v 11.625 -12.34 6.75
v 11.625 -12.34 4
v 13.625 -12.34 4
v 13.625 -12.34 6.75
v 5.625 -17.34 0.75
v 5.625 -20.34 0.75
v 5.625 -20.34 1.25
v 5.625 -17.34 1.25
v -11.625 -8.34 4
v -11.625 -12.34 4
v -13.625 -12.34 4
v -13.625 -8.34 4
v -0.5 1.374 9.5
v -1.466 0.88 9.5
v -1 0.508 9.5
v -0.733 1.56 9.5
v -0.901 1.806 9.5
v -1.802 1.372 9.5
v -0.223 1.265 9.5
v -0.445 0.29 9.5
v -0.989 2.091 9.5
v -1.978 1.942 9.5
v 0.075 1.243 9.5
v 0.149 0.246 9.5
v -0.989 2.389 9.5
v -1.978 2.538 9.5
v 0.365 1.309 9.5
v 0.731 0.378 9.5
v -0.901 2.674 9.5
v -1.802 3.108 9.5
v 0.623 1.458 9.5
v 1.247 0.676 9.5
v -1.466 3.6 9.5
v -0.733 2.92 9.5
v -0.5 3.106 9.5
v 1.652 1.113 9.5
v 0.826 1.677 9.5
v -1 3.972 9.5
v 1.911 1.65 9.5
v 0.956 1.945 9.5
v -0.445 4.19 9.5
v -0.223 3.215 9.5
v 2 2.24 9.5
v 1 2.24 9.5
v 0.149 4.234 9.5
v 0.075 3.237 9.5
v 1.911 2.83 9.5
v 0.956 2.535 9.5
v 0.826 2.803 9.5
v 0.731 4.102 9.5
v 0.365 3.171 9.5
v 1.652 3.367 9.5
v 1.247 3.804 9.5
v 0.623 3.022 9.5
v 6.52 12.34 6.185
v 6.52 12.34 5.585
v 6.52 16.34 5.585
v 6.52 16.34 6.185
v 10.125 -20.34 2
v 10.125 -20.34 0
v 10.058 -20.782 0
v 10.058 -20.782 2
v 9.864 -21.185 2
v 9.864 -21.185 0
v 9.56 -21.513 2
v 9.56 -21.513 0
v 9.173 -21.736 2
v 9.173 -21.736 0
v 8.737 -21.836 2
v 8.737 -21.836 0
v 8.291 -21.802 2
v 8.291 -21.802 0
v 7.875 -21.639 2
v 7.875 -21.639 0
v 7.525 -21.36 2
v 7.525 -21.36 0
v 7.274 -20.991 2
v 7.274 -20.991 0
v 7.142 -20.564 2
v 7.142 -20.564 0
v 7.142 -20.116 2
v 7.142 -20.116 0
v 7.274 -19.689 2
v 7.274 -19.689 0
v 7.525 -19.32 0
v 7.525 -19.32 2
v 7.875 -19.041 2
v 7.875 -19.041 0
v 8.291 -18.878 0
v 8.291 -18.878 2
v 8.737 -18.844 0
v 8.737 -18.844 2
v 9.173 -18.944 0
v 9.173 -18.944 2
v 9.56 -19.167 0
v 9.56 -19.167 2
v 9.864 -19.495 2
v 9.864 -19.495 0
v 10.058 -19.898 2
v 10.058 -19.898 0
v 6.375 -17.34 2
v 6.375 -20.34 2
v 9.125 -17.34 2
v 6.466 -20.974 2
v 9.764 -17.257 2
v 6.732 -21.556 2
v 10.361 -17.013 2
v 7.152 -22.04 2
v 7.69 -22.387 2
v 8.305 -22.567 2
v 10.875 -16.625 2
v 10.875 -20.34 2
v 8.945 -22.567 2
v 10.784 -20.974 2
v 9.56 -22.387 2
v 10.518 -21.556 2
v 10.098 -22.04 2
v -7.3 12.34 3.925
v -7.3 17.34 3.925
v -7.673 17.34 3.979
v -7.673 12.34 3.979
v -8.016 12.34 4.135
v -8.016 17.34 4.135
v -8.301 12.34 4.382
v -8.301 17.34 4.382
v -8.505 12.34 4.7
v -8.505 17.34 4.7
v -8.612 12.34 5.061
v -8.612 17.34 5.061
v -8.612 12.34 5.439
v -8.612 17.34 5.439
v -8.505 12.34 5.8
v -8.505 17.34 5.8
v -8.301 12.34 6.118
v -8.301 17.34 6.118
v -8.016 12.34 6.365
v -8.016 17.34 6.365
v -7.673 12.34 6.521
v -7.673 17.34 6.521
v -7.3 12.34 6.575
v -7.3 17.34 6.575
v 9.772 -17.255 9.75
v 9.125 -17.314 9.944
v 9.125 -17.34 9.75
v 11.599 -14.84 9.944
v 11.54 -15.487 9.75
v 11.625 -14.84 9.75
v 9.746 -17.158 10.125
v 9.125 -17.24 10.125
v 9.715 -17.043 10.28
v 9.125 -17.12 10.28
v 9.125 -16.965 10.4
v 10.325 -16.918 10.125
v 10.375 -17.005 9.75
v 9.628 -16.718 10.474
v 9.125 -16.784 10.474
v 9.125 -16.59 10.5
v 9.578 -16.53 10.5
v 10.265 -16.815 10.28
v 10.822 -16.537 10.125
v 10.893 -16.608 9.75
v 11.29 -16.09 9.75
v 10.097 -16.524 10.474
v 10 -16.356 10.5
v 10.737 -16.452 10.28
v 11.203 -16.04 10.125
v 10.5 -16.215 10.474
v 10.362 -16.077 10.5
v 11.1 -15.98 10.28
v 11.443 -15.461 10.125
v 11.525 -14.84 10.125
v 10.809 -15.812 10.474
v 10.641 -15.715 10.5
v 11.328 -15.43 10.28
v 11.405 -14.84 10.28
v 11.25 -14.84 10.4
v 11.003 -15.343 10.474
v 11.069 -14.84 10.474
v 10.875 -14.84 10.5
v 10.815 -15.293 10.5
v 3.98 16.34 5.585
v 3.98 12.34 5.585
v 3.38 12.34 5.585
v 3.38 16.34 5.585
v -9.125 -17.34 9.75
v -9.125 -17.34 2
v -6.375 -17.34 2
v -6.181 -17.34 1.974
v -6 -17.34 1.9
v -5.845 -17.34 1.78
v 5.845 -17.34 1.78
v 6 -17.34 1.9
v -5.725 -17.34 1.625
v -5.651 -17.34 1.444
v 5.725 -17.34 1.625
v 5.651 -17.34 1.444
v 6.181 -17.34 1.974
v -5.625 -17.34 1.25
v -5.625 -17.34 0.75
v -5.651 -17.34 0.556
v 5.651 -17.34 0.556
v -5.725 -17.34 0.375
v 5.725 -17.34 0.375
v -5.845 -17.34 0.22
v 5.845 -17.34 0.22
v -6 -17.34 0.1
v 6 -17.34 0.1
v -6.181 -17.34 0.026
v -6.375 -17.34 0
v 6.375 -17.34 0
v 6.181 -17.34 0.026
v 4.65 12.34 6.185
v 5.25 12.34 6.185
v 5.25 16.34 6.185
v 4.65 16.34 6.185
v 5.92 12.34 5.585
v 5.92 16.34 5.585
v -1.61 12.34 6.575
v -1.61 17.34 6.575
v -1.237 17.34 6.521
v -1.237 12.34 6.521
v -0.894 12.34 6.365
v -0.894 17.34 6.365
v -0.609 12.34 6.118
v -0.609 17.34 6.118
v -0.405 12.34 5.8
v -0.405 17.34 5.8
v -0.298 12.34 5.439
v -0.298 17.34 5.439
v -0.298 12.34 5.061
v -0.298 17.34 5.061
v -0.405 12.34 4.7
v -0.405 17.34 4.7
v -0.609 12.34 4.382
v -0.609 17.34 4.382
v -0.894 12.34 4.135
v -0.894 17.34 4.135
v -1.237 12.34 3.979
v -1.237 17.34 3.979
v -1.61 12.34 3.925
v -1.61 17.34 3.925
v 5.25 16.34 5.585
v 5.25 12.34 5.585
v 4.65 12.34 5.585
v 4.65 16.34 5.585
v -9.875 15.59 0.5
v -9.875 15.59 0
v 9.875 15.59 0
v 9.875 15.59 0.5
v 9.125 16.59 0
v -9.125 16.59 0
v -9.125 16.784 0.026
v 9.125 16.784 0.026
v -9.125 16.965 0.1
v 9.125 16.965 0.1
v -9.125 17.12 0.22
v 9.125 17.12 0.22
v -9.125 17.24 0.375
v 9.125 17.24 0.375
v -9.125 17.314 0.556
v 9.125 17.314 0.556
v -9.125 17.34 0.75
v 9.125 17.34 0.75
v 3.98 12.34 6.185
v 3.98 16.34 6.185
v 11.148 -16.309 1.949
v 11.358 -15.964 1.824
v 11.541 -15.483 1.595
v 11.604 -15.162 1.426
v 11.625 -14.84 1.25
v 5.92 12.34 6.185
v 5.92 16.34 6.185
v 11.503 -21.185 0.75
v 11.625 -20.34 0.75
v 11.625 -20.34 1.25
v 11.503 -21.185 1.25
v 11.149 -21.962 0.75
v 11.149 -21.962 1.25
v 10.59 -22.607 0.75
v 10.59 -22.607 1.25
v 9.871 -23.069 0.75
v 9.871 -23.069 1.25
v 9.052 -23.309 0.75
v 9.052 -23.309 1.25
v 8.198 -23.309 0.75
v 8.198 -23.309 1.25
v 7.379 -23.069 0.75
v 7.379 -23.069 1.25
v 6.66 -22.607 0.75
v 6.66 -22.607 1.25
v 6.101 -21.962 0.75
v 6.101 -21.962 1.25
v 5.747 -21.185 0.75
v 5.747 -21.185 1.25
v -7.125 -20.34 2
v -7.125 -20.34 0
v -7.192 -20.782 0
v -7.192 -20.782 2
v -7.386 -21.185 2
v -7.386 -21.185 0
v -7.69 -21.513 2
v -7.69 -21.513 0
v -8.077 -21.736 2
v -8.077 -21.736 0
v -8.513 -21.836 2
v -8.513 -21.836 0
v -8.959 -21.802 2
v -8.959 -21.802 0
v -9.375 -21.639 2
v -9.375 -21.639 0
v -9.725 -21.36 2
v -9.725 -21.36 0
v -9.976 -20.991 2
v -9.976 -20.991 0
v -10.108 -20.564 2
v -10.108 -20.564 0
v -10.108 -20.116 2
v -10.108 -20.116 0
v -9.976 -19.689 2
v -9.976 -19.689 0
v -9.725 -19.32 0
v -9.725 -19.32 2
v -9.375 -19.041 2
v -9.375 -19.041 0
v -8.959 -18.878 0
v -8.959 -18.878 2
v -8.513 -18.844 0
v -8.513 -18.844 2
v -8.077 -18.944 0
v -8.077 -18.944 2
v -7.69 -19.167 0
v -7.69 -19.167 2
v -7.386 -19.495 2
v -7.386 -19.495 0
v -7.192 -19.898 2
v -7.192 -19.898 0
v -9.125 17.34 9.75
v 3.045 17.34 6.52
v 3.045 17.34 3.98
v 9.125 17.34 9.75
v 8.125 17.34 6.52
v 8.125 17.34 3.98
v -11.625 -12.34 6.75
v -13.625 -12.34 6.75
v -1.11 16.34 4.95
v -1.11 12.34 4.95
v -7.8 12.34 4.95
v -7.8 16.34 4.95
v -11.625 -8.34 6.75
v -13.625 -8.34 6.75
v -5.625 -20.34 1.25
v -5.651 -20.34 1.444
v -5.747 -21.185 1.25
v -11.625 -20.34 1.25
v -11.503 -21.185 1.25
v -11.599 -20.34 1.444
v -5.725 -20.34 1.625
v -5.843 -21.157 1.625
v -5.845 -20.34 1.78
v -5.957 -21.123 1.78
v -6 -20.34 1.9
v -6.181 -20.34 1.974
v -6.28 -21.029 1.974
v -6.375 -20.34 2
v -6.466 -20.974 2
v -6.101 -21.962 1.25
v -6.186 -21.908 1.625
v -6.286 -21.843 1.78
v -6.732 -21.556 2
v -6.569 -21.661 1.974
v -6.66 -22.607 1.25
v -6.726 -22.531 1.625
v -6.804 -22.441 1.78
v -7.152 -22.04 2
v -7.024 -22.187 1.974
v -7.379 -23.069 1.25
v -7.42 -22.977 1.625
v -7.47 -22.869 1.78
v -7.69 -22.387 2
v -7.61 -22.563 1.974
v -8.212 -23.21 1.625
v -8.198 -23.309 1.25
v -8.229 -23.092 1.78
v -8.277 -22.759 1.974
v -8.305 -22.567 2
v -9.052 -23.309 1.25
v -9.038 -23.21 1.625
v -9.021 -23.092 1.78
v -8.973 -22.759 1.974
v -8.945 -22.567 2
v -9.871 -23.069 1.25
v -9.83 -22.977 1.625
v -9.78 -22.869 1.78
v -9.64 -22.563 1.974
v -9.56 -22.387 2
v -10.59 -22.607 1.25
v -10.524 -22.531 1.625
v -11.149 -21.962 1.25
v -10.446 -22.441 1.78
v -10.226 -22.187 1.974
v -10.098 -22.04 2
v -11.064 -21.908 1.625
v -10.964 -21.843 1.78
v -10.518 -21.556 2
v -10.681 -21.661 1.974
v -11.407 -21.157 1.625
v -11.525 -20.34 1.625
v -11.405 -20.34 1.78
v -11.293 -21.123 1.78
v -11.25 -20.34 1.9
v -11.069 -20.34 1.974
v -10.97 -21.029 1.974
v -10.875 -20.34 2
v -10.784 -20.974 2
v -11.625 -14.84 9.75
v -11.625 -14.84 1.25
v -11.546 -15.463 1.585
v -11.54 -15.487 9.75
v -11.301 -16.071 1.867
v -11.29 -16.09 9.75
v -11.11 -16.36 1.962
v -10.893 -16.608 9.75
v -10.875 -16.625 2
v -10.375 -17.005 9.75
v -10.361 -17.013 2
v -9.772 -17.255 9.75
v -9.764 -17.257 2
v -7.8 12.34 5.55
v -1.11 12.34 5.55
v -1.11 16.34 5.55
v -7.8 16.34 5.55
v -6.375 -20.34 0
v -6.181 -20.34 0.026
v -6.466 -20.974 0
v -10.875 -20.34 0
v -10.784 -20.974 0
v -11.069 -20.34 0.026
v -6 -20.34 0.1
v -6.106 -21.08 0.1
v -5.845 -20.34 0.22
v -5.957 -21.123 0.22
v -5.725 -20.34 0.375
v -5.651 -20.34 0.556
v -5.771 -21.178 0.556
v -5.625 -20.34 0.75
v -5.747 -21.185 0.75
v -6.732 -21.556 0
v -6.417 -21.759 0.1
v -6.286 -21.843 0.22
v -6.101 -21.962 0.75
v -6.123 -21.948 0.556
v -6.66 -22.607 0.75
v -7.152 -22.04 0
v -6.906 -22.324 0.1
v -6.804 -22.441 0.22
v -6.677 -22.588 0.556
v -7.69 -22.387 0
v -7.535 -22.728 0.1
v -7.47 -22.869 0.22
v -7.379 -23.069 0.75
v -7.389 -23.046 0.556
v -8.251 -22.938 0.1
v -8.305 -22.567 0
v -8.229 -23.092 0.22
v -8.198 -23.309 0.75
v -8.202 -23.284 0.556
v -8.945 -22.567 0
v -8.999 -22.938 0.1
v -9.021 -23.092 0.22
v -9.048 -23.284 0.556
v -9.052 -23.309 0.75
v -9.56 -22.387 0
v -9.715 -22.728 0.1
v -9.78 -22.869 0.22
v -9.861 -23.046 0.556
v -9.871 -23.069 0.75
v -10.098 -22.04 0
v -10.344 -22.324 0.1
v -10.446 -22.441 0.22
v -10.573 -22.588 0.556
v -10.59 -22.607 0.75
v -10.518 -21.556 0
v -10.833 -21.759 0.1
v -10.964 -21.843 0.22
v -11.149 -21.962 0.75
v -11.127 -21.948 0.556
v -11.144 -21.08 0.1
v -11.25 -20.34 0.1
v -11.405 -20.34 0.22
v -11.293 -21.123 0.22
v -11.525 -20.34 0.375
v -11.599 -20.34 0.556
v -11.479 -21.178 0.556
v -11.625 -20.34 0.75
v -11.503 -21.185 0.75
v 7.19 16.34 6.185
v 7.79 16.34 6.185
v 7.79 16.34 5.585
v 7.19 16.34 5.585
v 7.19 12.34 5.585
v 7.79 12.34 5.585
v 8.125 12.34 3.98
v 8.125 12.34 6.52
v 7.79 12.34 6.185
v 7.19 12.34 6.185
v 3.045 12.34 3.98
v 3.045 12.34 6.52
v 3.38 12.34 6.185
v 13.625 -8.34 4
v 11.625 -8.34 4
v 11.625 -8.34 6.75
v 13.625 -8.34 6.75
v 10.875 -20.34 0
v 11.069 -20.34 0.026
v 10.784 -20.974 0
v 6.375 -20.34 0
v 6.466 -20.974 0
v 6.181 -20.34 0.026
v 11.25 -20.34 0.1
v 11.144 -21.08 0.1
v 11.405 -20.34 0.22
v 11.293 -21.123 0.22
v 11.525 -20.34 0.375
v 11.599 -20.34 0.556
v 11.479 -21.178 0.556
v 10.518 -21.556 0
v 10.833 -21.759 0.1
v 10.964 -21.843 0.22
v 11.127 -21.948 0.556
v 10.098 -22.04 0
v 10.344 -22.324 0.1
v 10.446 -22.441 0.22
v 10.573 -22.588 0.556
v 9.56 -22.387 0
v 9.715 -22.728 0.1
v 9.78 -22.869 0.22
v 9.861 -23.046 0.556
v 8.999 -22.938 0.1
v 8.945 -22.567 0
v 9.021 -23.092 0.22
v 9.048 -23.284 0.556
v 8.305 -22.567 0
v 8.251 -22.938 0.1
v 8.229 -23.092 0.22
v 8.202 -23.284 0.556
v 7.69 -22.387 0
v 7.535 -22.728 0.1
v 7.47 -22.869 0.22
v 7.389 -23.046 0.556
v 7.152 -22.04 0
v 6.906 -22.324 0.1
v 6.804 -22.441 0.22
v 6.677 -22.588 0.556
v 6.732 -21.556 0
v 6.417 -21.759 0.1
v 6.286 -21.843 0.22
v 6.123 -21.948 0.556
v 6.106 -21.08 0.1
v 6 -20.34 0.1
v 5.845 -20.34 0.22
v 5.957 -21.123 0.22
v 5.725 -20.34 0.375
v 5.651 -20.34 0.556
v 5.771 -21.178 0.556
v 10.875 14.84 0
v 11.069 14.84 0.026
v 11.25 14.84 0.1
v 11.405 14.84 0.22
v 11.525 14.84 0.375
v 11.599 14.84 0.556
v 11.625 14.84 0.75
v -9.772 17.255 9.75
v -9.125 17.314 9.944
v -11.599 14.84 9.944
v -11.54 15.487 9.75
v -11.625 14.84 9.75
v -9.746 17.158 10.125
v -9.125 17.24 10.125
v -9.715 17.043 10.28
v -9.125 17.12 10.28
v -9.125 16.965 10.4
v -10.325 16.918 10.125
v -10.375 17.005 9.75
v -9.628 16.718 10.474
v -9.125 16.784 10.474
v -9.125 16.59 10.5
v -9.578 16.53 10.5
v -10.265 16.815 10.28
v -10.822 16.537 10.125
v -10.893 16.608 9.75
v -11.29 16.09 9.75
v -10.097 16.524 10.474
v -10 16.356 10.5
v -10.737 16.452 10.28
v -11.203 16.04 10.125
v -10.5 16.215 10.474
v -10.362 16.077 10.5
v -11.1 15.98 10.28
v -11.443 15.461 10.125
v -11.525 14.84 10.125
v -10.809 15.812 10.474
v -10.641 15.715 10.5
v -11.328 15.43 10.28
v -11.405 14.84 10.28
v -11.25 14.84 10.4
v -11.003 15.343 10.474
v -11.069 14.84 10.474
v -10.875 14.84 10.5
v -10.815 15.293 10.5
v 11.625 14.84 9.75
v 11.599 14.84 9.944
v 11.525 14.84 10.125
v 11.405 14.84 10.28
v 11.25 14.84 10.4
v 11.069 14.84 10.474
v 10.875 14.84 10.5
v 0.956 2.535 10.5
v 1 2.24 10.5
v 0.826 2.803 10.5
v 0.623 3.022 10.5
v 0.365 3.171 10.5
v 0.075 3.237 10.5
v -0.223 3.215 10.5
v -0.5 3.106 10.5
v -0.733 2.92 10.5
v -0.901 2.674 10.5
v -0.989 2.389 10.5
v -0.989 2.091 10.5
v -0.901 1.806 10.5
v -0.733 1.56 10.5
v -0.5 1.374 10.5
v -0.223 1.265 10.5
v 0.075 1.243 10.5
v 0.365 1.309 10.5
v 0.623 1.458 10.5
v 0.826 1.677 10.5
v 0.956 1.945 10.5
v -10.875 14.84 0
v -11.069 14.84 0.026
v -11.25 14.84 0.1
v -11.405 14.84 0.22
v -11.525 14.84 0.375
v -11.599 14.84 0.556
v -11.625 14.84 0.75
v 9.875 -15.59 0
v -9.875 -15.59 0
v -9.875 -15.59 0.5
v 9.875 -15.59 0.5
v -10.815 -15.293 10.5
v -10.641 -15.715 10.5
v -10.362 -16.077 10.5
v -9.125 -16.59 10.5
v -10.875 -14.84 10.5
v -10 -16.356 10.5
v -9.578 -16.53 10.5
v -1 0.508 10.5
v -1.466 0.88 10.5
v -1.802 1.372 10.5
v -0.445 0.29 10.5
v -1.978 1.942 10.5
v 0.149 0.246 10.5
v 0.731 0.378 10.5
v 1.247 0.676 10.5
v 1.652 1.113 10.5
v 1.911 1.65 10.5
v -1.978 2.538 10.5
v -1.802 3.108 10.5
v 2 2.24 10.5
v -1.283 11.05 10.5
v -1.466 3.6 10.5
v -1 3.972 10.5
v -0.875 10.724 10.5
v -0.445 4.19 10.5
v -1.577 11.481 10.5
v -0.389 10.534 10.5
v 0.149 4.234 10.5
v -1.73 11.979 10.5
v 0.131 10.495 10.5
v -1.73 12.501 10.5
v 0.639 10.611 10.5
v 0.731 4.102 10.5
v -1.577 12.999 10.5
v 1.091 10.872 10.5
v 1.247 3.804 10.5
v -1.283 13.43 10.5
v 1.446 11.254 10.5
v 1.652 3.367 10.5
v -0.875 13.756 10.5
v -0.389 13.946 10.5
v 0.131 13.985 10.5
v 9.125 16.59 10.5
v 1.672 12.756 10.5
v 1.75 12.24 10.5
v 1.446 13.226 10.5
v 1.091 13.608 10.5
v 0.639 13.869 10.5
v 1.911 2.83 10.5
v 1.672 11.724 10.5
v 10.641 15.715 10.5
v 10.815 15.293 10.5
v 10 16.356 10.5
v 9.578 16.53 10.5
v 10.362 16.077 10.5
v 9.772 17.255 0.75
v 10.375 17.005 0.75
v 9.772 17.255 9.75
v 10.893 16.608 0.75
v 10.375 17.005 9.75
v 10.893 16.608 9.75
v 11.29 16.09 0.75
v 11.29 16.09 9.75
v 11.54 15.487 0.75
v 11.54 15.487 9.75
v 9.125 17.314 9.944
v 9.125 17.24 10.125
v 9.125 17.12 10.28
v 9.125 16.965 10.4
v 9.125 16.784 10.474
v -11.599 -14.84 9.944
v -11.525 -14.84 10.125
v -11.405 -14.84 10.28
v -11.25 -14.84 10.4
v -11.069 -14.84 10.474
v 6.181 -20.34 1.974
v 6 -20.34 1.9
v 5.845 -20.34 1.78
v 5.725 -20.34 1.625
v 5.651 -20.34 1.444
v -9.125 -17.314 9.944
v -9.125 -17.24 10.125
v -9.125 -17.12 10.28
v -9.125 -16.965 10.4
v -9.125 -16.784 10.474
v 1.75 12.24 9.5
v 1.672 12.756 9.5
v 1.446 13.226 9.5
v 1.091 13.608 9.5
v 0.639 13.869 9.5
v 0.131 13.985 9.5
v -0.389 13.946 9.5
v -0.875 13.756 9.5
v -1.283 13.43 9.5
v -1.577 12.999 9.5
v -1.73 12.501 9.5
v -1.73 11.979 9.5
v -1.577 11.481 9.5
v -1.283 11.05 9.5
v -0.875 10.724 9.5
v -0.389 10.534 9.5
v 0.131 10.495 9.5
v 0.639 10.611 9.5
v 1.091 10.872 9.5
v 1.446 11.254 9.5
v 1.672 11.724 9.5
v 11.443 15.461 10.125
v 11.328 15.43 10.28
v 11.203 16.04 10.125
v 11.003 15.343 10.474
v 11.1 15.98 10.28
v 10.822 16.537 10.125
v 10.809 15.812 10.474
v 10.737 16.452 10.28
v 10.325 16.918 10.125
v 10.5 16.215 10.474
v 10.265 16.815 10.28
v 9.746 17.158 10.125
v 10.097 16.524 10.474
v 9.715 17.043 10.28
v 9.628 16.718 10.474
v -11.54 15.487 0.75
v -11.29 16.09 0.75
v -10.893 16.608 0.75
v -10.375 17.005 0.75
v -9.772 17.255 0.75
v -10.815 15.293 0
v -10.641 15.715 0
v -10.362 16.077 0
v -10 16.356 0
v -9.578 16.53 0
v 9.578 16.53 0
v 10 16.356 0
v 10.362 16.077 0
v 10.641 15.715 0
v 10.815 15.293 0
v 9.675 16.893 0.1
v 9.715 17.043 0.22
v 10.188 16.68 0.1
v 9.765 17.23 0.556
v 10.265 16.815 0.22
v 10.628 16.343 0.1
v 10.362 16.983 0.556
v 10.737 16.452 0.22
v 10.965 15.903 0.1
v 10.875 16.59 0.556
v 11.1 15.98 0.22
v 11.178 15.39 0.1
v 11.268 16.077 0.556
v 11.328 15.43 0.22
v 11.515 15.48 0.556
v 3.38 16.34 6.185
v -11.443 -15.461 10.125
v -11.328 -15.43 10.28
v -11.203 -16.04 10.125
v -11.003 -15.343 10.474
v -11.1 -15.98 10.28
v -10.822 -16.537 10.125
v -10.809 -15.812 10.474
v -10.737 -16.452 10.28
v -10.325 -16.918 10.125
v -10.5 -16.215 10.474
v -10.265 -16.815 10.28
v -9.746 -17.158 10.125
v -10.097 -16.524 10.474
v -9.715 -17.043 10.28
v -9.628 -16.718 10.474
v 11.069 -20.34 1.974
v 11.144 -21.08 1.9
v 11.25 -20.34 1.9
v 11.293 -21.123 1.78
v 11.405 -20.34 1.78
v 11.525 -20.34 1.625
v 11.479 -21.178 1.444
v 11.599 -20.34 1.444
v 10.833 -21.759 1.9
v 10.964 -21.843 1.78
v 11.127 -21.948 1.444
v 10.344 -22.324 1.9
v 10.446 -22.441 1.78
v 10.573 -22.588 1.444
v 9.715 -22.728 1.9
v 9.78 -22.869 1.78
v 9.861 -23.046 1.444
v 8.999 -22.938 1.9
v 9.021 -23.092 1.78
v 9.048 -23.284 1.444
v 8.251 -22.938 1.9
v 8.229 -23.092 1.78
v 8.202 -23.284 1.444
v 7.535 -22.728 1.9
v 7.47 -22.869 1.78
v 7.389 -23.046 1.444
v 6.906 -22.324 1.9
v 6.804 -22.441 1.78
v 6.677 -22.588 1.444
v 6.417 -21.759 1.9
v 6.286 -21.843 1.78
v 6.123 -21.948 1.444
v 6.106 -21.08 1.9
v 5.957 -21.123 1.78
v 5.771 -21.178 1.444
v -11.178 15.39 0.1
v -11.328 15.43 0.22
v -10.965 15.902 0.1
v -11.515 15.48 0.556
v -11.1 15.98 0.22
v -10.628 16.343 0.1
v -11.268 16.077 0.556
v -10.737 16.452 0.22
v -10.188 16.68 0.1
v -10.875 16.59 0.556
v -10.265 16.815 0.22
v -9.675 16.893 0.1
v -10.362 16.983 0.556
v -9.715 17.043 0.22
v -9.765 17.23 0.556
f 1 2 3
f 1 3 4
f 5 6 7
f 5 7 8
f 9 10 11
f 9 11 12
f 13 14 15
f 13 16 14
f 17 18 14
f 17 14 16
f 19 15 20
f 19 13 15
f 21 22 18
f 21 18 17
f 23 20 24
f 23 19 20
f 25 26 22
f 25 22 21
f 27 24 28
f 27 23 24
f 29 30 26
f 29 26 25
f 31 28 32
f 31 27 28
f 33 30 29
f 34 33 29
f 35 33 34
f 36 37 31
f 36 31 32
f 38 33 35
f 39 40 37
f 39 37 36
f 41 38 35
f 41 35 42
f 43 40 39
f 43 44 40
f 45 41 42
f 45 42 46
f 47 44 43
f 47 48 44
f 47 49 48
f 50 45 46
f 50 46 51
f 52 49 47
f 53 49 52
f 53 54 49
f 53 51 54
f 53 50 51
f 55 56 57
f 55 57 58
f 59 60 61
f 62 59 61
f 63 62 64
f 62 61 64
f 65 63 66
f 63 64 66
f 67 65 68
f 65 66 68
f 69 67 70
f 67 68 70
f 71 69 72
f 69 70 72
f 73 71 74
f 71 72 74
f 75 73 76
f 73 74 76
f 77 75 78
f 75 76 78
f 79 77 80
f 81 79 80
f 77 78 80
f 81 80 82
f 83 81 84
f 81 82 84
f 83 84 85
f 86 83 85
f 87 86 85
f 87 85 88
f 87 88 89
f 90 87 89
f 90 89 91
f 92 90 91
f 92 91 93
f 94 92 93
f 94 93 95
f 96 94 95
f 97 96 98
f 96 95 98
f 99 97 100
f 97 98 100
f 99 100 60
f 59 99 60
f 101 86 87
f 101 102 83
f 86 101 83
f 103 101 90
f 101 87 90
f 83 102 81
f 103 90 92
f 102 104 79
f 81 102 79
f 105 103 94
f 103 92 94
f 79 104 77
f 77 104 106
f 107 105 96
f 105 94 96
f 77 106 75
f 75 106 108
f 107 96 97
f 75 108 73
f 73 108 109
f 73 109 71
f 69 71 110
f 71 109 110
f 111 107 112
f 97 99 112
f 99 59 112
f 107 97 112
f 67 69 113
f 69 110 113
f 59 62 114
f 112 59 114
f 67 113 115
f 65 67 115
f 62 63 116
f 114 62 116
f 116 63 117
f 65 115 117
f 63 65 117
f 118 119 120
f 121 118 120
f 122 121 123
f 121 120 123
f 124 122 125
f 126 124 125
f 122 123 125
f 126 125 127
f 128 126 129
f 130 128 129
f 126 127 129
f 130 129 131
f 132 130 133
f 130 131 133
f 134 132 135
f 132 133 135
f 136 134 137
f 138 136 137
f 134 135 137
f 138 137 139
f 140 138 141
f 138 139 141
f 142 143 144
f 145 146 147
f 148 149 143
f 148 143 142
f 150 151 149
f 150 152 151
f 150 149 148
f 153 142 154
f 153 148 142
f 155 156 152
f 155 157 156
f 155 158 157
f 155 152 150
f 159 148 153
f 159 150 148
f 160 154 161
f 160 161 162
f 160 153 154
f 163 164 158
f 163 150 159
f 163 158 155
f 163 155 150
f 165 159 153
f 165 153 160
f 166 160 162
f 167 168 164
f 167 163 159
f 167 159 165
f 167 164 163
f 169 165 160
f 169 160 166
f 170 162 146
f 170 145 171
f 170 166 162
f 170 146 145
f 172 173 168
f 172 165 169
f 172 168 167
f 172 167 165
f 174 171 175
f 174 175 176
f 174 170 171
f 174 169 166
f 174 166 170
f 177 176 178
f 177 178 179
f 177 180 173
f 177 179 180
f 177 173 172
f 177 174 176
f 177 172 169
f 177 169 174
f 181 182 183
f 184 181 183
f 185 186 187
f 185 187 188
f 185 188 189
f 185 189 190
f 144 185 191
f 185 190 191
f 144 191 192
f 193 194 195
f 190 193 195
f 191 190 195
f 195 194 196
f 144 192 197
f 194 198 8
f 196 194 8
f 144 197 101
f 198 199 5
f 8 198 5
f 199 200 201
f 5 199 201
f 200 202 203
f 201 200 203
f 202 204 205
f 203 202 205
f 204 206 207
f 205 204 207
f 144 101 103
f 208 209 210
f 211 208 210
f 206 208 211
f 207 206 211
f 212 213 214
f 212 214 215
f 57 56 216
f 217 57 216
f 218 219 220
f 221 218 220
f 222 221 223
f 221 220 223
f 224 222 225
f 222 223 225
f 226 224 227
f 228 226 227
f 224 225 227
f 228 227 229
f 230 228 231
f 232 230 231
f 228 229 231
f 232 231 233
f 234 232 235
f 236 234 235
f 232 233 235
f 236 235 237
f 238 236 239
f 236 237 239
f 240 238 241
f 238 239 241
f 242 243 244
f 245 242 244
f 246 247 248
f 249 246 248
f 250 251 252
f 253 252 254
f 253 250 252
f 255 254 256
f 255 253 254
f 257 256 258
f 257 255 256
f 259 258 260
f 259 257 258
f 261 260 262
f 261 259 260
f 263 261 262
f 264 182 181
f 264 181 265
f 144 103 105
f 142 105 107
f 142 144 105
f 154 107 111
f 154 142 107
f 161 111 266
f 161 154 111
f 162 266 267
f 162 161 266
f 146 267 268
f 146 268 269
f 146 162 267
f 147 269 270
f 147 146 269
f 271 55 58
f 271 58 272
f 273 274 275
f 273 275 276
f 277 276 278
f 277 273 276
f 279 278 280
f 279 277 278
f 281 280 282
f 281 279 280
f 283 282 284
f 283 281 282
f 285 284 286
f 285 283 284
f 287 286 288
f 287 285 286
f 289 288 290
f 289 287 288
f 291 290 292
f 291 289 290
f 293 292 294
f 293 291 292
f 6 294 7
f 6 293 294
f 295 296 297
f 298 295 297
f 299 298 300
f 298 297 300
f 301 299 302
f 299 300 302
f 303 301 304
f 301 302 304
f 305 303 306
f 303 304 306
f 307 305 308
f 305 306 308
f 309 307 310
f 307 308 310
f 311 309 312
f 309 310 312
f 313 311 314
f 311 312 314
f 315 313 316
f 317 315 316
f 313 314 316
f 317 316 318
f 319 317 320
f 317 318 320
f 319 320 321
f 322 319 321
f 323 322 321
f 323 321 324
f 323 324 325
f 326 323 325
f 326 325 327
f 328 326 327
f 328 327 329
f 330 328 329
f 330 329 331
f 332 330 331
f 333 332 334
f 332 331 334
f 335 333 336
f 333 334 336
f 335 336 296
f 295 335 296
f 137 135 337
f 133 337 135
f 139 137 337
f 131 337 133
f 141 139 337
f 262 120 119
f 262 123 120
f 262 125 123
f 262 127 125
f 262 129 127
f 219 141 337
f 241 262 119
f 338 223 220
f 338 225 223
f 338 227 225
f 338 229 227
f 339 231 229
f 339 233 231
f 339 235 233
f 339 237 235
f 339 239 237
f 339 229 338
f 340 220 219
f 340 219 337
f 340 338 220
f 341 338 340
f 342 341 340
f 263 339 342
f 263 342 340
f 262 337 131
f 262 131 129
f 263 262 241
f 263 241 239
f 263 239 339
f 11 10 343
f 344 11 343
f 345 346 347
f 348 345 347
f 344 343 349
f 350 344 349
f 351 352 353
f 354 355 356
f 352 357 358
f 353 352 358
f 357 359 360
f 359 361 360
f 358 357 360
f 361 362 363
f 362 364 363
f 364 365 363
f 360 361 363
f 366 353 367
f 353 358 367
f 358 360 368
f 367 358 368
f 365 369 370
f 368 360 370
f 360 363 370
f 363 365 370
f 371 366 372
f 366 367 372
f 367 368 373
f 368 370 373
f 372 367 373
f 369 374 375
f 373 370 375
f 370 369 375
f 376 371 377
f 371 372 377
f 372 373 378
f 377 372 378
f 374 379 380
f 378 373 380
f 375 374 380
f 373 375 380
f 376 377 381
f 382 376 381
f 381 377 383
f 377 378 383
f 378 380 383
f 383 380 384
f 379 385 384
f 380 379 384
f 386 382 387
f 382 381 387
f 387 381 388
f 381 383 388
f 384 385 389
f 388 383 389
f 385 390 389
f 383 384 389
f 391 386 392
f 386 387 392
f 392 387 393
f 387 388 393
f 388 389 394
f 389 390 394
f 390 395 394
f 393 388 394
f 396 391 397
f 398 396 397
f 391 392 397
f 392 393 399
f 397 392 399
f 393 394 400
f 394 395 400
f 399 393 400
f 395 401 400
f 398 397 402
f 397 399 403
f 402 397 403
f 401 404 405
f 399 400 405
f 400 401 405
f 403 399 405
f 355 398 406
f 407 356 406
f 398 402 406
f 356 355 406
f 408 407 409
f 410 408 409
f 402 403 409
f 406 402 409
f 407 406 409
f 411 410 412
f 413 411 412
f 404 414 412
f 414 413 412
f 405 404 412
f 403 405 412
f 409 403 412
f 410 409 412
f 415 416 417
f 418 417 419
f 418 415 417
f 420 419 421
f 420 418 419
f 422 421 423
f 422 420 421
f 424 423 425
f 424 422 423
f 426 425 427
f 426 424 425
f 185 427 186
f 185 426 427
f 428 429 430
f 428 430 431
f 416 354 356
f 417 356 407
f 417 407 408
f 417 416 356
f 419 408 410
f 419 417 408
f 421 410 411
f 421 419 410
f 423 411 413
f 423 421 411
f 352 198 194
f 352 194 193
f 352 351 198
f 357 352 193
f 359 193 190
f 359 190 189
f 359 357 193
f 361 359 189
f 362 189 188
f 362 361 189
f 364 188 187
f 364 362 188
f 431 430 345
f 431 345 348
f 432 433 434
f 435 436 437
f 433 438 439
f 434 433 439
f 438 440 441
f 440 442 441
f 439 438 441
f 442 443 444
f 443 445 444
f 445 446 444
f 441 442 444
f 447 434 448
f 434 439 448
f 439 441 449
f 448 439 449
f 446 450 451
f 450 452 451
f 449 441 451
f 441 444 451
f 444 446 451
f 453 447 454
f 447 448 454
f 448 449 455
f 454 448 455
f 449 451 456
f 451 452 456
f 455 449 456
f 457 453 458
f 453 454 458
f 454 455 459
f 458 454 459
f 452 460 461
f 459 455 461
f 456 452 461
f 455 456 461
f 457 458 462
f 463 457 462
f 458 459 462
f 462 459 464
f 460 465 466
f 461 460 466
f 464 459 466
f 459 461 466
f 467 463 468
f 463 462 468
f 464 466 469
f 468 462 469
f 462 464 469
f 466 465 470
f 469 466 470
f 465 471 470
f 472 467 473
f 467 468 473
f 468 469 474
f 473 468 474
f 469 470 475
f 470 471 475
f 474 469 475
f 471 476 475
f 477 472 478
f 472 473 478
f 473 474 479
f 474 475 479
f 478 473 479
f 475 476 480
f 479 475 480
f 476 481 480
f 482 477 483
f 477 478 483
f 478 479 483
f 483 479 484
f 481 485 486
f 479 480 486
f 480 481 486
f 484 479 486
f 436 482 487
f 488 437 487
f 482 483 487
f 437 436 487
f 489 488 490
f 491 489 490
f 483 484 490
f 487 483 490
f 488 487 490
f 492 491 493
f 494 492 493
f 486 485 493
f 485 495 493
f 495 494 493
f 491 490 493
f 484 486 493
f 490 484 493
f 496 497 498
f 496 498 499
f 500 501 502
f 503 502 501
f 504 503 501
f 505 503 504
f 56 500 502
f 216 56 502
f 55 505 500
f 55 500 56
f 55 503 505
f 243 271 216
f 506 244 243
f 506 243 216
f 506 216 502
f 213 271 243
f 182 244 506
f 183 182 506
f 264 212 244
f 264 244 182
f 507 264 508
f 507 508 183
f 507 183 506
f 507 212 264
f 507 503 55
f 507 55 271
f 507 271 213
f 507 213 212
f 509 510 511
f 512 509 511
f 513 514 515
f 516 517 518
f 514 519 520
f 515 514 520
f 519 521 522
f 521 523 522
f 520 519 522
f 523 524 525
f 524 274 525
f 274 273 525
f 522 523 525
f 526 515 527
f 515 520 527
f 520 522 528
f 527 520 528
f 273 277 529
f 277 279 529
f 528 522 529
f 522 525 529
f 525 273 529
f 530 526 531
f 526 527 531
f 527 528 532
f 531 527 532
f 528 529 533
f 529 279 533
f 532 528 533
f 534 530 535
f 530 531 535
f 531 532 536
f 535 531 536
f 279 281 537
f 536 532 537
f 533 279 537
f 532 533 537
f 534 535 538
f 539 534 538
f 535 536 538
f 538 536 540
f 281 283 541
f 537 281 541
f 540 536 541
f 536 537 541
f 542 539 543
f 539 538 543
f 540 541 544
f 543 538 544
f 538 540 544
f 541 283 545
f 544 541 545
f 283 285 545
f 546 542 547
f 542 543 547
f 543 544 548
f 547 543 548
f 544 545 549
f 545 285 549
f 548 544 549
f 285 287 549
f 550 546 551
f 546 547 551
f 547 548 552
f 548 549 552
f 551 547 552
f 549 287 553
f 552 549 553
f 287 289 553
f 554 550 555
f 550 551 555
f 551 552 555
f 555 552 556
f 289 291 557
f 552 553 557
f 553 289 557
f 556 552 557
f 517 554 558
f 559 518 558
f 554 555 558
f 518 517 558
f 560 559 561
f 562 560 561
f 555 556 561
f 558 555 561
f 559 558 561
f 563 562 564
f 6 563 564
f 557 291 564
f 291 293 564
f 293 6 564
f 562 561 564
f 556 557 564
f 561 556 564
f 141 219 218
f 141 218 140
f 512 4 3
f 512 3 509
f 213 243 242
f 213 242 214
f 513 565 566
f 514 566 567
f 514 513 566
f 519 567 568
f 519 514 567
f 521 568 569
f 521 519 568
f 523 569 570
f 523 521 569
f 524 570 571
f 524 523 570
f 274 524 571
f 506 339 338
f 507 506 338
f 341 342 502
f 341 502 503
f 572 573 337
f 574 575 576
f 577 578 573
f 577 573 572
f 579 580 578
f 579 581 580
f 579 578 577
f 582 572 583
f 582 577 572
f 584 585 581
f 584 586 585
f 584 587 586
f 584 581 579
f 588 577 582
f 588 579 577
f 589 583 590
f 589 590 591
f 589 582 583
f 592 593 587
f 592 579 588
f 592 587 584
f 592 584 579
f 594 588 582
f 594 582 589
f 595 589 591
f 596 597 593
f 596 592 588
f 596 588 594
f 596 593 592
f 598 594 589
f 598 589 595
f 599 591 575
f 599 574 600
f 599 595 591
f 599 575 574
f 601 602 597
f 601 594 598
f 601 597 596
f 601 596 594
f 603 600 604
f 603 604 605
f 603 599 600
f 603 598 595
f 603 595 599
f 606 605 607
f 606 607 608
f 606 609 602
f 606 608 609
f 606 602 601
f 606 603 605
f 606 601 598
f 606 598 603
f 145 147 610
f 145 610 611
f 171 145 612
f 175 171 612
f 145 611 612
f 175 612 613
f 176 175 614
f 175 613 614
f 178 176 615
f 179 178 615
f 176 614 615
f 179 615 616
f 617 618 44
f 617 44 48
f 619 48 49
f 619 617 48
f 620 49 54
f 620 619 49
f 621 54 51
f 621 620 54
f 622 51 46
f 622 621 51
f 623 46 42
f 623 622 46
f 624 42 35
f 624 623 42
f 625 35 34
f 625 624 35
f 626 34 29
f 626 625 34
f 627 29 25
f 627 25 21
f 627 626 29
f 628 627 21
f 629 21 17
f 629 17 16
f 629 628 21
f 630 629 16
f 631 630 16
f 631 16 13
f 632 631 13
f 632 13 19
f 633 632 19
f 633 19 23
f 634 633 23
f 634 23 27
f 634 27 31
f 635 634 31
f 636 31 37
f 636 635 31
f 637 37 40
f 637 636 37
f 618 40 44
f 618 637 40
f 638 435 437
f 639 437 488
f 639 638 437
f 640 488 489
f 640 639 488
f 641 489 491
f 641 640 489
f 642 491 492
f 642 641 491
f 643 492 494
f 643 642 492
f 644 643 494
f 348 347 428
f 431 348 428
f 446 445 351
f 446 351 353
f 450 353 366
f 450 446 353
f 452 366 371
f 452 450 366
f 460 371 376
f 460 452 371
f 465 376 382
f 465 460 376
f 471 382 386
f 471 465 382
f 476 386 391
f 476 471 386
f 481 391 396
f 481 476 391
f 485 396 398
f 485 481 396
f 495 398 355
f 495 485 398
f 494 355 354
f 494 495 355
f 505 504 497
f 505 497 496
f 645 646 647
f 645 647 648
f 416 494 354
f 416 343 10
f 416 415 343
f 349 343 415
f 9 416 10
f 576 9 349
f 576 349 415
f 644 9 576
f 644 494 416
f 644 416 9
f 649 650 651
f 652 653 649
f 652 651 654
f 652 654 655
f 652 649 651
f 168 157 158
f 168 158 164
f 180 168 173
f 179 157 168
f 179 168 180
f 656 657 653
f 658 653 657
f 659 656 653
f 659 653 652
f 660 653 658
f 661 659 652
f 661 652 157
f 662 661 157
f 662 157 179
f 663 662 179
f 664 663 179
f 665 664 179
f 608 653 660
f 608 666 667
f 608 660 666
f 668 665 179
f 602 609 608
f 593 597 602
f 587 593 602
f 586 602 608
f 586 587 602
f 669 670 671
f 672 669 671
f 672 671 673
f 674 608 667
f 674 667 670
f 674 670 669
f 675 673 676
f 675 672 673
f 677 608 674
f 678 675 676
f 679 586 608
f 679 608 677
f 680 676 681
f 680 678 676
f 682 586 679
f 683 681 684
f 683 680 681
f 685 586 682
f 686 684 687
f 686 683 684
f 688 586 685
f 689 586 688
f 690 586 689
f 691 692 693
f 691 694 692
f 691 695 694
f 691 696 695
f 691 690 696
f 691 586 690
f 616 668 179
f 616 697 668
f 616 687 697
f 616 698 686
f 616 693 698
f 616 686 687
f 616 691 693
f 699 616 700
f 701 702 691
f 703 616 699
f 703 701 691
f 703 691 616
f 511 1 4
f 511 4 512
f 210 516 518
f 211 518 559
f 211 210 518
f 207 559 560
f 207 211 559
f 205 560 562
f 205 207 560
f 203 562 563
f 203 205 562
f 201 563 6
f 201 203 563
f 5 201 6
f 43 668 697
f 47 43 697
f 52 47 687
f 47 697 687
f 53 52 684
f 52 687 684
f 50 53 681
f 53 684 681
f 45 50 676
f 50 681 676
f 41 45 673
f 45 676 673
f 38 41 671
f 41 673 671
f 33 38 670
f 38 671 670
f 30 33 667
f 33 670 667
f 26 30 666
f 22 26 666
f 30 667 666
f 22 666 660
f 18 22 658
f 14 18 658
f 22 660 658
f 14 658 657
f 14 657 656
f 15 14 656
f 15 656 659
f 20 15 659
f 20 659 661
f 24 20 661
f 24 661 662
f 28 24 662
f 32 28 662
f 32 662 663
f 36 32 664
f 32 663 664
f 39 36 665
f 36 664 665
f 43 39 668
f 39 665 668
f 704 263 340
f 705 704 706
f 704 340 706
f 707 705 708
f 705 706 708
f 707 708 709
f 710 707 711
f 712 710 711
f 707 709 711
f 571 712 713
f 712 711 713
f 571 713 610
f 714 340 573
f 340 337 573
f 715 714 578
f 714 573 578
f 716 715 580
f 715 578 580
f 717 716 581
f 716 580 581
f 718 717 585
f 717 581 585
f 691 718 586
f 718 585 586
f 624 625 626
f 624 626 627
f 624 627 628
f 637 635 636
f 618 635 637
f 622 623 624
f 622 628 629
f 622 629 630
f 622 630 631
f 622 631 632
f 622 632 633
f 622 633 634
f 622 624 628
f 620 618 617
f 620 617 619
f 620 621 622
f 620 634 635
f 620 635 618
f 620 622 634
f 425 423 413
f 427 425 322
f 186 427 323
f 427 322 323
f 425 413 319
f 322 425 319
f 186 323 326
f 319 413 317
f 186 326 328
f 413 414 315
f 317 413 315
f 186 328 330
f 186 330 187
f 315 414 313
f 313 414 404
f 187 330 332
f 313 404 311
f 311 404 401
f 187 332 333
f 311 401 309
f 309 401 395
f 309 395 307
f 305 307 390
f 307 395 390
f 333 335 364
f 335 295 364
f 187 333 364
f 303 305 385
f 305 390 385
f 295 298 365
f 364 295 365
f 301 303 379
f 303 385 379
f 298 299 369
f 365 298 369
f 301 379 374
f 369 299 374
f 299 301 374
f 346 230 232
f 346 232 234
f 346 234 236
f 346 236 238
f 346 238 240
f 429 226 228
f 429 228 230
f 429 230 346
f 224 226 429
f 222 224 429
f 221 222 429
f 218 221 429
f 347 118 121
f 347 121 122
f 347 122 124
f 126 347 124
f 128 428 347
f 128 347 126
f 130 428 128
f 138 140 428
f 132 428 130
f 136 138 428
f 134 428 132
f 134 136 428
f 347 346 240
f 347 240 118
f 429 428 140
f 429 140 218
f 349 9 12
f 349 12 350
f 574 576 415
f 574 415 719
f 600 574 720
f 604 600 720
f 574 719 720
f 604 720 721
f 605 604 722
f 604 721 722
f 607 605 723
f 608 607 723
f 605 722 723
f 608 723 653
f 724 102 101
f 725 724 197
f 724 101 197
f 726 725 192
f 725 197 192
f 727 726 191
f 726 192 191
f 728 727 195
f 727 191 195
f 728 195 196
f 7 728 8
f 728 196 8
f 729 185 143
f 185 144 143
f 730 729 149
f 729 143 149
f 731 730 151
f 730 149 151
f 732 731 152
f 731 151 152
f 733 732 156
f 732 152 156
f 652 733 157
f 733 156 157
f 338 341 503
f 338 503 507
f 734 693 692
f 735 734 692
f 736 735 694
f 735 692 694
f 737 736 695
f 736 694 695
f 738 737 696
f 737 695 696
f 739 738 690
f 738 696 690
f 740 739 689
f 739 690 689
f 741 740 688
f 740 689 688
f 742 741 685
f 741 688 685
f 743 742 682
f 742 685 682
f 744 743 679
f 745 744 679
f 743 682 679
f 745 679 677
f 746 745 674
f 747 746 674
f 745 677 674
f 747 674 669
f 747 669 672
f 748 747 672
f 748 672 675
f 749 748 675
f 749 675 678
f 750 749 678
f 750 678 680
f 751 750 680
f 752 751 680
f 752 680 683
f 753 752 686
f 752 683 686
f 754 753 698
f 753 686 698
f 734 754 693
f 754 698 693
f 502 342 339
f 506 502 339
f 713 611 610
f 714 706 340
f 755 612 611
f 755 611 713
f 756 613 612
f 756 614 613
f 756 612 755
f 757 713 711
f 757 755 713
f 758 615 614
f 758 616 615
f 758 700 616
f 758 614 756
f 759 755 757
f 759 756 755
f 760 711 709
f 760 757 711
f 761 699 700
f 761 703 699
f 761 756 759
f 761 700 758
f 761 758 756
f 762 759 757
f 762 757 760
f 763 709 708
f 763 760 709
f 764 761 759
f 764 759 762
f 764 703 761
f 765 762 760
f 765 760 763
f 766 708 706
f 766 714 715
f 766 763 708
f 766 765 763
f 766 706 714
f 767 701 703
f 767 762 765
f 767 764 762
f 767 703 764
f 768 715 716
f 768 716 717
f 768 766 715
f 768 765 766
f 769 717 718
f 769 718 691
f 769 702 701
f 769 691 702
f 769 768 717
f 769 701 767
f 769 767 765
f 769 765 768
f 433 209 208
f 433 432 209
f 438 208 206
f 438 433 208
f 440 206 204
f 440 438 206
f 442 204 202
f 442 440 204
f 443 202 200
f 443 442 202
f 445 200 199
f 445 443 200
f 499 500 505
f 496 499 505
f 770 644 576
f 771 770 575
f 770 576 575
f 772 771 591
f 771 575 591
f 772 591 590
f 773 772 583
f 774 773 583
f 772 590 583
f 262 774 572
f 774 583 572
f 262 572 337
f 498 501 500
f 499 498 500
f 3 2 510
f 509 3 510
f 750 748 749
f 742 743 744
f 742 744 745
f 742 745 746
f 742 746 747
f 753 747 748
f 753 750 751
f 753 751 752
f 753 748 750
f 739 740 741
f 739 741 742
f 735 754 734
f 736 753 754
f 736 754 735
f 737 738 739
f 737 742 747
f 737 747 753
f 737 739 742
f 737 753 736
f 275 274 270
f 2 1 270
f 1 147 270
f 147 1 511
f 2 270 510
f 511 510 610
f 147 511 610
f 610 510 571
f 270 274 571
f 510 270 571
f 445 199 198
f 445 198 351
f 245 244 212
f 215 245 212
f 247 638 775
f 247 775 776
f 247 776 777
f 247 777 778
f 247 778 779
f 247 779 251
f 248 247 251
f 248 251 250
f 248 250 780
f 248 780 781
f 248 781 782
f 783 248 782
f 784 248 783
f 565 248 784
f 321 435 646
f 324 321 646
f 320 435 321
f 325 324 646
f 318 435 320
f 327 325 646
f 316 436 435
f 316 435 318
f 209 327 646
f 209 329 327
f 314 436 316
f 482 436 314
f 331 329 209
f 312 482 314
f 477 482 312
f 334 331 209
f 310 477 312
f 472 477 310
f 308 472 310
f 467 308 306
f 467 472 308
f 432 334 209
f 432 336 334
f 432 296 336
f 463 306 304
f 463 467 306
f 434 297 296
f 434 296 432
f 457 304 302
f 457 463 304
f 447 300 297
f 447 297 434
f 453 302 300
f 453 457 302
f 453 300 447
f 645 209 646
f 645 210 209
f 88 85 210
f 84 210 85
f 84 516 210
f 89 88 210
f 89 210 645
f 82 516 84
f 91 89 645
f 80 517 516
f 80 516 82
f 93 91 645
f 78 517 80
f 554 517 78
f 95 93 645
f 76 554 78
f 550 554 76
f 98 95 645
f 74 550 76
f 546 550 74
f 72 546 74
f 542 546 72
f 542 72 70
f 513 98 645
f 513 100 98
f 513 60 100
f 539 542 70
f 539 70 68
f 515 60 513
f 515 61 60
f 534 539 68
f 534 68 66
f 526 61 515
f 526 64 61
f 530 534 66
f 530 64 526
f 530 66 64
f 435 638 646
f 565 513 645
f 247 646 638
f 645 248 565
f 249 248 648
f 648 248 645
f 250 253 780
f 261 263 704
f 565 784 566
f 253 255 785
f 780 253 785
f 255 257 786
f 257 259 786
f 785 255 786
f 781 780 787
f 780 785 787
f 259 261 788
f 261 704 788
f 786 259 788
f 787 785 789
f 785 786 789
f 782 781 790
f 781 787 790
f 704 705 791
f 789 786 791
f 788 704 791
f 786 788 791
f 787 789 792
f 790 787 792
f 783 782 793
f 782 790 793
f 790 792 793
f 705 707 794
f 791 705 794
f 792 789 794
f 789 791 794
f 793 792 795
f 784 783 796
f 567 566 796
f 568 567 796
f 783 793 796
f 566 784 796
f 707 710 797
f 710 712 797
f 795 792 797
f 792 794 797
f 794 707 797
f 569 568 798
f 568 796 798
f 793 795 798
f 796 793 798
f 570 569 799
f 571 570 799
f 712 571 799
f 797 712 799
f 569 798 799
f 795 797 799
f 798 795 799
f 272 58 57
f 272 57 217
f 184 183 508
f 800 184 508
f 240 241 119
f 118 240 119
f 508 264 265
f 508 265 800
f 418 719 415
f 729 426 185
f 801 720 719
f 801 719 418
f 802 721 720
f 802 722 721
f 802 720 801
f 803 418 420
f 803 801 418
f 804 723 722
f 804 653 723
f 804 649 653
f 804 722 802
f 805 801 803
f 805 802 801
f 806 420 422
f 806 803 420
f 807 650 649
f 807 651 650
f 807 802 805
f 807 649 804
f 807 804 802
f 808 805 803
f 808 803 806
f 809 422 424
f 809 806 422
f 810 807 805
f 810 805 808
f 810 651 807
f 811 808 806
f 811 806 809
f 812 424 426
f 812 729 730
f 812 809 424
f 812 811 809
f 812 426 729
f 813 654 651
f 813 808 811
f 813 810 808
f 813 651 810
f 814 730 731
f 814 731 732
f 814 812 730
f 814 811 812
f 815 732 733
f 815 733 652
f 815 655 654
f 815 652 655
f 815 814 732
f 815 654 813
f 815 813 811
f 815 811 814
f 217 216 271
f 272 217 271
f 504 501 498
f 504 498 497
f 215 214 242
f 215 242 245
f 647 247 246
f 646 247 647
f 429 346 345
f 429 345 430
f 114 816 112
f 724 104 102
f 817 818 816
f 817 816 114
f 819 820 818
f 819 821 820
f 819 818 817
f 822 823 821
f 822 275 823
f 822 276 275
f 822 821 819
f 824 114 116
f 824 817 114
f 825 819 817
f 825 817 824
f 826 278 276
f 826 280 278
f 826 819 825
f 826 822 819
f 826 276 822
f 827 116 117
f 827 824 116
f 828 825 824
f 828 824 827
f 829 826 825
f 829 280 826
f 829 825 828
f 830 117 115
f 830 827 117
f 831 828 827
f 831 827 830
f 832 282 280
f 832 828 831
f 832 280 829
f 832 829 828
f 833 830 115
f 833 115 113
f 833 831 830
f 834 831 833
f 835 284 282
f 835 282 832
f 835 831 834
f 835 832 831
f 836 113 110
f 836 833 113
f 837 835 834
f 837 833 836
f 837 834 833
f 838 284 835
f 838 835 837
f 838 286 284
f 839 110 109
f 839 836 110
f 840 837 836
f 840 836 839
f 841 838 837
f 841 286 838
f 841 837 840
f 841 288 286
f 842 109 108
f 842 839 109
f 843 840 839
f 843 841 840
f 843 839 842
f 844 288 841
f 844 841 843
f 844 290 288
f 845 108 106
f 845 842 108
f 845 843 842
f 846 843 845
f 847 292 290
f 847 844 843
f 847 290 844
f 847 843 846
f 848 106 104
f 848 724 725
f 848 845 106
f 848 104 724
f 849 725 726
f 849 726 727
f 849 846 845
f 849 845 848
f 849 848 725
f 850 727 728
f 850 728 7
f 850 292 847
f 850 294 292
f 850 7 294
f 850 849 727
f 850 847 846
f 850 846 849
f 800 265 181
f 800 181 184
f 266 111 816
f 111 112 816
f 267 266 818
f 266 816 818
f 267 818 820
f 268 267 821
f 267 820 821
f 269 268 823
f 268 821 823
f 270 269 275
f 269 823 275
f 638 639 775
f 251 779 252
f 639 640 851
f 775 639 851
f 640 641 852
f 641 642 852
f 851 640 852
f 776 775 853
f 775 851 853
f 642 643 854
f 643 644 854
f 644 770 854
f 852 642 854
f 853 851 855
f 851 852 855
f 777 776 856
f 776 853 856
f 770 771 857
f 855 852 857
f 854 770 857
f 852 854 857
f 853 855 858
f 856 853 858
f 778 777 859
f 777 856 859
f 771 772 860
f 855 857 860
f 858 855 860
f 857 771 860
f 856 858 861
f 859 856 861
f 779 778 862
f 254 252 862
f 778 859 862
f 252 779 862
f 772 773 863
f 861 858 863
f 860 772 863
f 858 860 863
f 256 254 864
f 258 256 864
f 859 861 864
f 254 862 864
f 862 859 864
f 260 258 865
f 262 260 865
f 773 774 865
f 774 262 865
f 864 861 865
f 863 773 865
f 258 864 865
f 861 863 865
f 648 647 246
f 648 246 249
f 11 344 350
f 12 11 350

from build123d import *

# Parameters (mm, degrees)
SKETCH_W        = 23.25
SKETCH_H        = 34.68
PAD_DEPTH       = 10.5
SKETCH001_R     = 1.5
PAD001_DEPTH    = 2
SKETCH002_R     = 1.75
SKETCH002_R_2   = 2
SKETCH002_R_3   = 1
POCKET_DEPTH    = 1
FILLET_R        = 2.5
FILLET001_R     = 0.75
SKETCH003_W     = 5.08
SKETCH003_H     = 2.54
POCKET001_DEPTH = 5
SKETCH004_W     = 0.6
SKETCH004_H     = 0.6
SKETCH004_W_2   = 6.69
PAD002_DEPTH    = 4
SKETCH005_W     = 19.75
SKETCH005_H     = 31.18
POCKET002_DEPTH = 0.5
SKETCH006_W     = 4
SKETCH006_H     = 2.75
PAD003_DEPTH    = 2


with BuildPart() as part:
    # Sketch → Pad (new body)
    with BuildSketch(Plane.XY):
        Rectangle(SKETCH_W, SKETCH_H)
    extrude(amount=PAD_DEPTH)

    # Sketch001 (on Face5 of Pad) → Pad001 (join)
    with BuildSketch(Plane(origin=(0, 0, 0), x_dir=(1, 0, 0), z_dir=(0, 0, -1))):
        with BuildLine():
            Line((-11.625, 20.34), (-11.625, 17.34))
            Line((-11.625, 17.34), (-5.625, 17.34))
            Line((-5.625, 17.34), (-5.625, 20.34))
            ThreePointArc((-5.625, 20.34), (-8.625, 23.34), (-11.625, 20.34))
        make_face()
        with Locations((-8.625, 20.34)):
            Circle(SKETCH001_R, mode=Mode.SUBTRACT)
        with BuildLine():
            Line((5.625, 20.34), (5.625, 17.34))
            Line((5.625, 17.34), (11.625, 17.34))
            Line((11.625, 17.34), (11.625, 20.34))
            ThreePointArc((11.625, 20.34), (8.625, 23.34), (5.625, 20.34))
        make_face()
        with Locations((8.625, 20.34)):
            Circle(SKETCH001_R, mode=Mode.SUBTRACT)
    extrude(amount=-PAD001_DEPTH)

    # Sketch002 (on Face2 of Pad001) → Pocket (cut)
    with BuildSketch(Plane.XY.offset(10.5)):
        with Locations((0, 12.24)):
            Circle(SKETCH002_R)
        with Locations((0, 2.24)):
            Circle(SKETCH002_R_2)
        with Locations((0, 2.24)):
            Circle(SKETCH002_R_3, mode=Mode.SUBTRACT)
    extrude(amount=-POCKET_DEPTH, mode=Mode.SUBTRACT)

    # Fillet
    fillet_edges = [part.edges().sort_by_distance(p)[0] for p in [
        (11.625, -17.34, 6.25),
        (-11.625, -17.34, 6.25),
        (11.625, 17.34, 5.25),
        (-11.625, 17.34, 5.25),
    ]]
    fillet(fillet_edges, radius=FILLET_R)

    # Fillet001
    fillet001_edges = [part.edges().sort_by_distance(p)[0] for p in [
        (11.625, 0, 10.5),
        (10.892767, -16.607767, 10.5),
        (0, -17.34, 10.5),
        (-10.892767, -16.607767, 10.5),
        (-11.625, 0, 10.5),
        (-10.892767, 16.607767, 10.5),
        (0, 17.34, 10.5),
        (10.892767, 16.607767, 10.5),
        (-10.892767, 16.607767, 0),
        (-11.625, -18.84, 2),
        (-8.625, -23.34, 2),
        (-5.625, -18.84, 2),
        (5.625, -18.84, 2),
        (8.625, -23.34, 2),
        (11.625, -18.84, 2),
    ]]
    fillet(fillet001_edges, radius=FILLET001_R)

    # Sketch003 (on Face41 of Fillet001) → Pocket001 (cut)
    with BuildSketch(Plane(origin=(0, 17.34, 0), x_dir=(-1, 0, 0), z_dir=(0, 1, 0))):
        with Locations((-5.585, 5.25)):
            Rectangle(SKETCH003_W, SKETCH003_H)
        with BuildLine():
            ThreePointArc((1.61, 6.575), (0.285, 5.25), (1.61, 3.925))
            Line((1.61, 3.925), (7.3, 3.925))
            ThreePointArc((7.3, 3.925), (8.625, 5.25), (7.3, 6.575))
            Line((1.61, 6.575), (7.3, 6.575))
        make_face()
    extrude(amount=-POCKET001_DEPTH, mode=Mode.SUBTRACT)

    # Sketch004 (on Face55 of Pocket001) → Pad002 (join)
    with BuildSketch(Plane(origin=(0, 12.34, 0), x_dir=(-1, 0, 0), z_dir=(0, 1, 0))):
        with Locations((-7.49, 5.885)):
            Rectangle(SKETCH004_W, SKETCH004_H)
        with Locations((-6.22, 5.885)):
            Rectangle(SKETCH004_W, SKETCH004_H)
        with Locations((-4.95, 5.885)):
            Rectangle(SKETCH004_W, SKETCH004_H)
        with Locations((-3.68, 5.885)):
            Rectangle(SKETCH004_W, SKETCH004_H)
        with Locations((4.455, 5.25)):
            Rectangle(SKETCH004_W_2, SKETCH004_H)
    extrude(amount=PAD002_DEPTH)

    # Sketch005 (on Face9 of Pad002) → Pocket002 (cut)
    with BuildSketch(Plane(origin=(0, 0, 0), x_dir=(1, 0, 0), z_dir=(0, 0, -1))):
        Rectangle(SKETCH005_W, SKETCH005_H)
    extrude(amount=-POCKET002_DEPTH, mode=Mode.SUBTRACT)

    # Sketch006 (on Face24 of Pocket002) → Pad003 (join)
    with BuildSketch(Plane.YZ.offset(11.625)):
        with Locations((-10.34, 5.375)):
            Rectangle(SKETCH006_W, SKETCH006_H)
    pad003 = extrude(amount=PAD003_DEPTH)

    # Mirrored: Pad003 across YZ
    add(pad003.mirror(Plane.YZ))


solid = part.part
